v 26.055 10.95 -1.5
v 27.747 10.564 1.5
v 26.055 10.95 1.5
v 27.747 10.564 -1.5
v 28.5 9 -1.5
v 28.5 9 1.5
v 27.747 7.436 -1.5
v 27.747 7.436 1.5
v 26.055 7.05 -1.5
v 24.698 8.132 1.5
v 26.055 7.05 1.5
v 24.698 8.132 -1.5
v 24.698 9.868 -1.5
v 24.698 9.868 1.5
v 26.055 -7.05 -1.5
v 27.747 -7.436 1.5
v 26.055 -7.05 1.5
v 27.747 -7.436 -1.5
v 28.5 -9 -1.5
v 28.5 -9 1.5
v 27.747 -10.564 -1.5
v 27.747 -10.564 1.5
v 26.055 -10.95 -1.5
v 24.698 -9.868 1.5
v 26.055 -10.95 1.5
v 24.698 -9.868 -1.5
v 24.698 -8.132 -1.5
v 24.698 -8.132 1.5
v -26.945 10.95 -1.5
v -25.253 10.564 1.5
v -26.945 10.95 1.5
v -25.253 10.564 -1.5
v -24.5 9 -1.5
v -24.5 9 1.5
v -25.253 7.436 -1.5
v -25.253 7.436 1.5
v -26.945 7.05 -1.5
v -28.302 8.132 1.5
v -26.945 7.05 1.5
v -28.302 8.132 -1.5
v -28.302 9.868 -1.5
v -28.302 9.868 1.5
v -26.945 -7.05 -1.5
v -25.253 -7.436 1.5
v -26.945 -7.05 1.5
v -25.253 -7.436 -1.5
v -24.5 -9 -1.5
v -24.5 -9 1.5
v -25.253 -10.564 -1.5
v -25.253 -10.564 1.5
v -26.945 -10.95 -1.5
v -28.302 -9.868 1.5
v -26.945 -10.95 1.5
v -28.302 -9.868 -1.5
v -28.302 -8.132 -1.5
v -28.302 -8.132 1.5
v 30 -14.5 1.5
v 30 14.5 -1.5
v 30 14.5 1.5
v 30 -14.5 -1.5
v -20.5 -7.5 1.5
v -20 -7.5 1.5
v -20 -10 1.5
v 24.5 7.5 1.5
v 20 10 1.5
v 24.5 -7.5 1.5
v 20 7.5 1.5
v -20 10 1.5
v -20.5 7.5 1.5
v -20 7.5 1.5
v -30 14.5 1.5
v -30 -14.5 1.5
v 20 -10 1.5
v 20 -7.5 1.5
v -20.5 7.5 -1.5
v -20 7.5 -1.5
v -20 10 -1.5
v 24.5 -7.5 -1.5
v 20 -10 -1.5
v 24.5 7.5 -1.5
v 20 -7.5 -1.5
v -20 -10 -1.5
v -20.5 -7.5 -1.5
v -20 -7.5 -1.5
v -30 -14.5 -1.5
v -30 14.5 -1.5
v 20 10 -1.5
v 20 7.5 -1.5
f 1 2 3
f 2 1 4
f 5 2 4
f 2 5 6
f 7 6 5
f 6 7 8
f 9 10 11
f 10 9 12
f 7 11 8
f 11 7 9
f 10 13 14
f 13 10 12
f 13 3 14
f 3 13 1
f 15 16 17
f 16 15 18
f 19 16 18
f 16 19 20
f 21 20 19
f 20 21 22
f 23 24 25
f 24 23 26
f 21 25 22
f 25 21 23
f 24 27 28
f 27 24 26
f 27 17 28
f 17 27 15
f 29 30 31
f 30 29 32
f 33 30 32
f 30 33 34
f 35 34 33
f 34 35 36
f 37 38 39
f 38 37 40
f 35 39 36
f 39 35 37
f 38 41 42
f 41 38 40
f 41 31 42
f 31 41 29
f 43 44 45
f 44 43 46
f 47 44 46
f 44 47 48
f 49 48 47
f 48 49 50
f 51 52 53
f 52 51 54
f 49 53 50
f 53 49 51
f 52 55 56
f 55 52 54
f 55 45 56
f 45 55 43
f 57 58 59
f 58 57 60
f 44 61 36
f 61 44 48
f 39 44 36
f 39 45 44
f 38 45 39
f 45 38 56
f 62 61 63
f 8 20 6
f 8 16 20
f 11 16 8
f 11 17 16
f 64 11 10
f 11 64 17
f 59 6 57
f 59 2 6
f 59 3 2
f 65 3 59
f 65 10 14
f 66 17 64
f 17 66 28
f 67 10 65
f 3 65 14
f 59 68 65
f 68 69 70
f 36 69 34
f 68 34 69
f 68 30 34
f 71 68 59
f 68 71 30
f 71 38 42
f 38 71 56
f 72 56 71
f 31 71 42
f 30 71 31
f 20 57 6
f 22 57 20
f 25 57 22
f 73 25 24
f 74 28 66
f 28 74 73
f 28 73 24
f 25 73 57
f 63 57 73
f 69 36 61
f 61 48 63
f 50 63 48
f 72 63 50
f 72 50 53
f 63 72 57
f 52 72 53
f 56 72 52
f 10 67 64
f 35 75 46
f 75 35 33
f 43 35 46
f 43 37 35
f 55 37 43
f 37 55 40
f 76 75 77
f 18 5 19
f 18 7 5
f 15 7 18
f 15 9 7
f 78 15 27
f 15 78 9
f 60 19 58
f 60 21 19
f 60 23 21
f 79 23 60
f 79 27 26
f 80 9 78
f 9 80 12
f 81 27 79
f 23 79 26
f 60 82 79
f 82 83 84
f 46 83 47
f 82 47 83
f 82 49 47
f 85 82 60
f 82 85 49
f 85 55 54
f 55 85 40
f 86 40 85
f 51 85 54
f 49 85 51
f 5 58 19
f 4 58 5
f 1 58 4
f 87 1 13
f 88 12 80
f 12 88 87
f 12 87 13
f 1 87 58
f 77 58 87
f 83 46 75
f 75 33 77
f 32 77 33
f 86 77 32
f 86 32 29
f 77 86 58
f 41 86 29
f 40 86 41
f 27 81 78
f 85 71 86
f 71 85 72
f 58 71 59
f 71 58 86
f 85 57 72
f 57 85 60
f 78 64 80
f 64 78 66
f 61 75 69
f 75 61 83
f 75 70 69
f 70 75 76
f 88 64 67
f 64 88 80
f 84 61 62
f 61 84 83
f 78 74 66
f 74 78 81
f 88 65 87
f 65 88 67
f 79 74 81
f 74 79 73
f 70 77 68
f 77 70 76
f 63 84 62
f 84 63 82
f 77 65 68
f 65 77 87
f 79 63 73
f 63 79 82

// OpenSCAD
thick  = 3;

module fourHole(x, y, dia){   // method for creating four hole pattern
    xy = [1,-1];
for(a = [0:1],b=[0:1]){
  translate([x/2*xy[a],y/2*xy[b],0])
   
   cylinder(30,d=dia,center = true);
}    
}

difference(){
    cube([60,29,thick], center = true);
    translate([2,0,0])
    cube([45,15,10],center = true);
    cube([40,20,10],center = true);
    fourHole(53,18,4);
}
